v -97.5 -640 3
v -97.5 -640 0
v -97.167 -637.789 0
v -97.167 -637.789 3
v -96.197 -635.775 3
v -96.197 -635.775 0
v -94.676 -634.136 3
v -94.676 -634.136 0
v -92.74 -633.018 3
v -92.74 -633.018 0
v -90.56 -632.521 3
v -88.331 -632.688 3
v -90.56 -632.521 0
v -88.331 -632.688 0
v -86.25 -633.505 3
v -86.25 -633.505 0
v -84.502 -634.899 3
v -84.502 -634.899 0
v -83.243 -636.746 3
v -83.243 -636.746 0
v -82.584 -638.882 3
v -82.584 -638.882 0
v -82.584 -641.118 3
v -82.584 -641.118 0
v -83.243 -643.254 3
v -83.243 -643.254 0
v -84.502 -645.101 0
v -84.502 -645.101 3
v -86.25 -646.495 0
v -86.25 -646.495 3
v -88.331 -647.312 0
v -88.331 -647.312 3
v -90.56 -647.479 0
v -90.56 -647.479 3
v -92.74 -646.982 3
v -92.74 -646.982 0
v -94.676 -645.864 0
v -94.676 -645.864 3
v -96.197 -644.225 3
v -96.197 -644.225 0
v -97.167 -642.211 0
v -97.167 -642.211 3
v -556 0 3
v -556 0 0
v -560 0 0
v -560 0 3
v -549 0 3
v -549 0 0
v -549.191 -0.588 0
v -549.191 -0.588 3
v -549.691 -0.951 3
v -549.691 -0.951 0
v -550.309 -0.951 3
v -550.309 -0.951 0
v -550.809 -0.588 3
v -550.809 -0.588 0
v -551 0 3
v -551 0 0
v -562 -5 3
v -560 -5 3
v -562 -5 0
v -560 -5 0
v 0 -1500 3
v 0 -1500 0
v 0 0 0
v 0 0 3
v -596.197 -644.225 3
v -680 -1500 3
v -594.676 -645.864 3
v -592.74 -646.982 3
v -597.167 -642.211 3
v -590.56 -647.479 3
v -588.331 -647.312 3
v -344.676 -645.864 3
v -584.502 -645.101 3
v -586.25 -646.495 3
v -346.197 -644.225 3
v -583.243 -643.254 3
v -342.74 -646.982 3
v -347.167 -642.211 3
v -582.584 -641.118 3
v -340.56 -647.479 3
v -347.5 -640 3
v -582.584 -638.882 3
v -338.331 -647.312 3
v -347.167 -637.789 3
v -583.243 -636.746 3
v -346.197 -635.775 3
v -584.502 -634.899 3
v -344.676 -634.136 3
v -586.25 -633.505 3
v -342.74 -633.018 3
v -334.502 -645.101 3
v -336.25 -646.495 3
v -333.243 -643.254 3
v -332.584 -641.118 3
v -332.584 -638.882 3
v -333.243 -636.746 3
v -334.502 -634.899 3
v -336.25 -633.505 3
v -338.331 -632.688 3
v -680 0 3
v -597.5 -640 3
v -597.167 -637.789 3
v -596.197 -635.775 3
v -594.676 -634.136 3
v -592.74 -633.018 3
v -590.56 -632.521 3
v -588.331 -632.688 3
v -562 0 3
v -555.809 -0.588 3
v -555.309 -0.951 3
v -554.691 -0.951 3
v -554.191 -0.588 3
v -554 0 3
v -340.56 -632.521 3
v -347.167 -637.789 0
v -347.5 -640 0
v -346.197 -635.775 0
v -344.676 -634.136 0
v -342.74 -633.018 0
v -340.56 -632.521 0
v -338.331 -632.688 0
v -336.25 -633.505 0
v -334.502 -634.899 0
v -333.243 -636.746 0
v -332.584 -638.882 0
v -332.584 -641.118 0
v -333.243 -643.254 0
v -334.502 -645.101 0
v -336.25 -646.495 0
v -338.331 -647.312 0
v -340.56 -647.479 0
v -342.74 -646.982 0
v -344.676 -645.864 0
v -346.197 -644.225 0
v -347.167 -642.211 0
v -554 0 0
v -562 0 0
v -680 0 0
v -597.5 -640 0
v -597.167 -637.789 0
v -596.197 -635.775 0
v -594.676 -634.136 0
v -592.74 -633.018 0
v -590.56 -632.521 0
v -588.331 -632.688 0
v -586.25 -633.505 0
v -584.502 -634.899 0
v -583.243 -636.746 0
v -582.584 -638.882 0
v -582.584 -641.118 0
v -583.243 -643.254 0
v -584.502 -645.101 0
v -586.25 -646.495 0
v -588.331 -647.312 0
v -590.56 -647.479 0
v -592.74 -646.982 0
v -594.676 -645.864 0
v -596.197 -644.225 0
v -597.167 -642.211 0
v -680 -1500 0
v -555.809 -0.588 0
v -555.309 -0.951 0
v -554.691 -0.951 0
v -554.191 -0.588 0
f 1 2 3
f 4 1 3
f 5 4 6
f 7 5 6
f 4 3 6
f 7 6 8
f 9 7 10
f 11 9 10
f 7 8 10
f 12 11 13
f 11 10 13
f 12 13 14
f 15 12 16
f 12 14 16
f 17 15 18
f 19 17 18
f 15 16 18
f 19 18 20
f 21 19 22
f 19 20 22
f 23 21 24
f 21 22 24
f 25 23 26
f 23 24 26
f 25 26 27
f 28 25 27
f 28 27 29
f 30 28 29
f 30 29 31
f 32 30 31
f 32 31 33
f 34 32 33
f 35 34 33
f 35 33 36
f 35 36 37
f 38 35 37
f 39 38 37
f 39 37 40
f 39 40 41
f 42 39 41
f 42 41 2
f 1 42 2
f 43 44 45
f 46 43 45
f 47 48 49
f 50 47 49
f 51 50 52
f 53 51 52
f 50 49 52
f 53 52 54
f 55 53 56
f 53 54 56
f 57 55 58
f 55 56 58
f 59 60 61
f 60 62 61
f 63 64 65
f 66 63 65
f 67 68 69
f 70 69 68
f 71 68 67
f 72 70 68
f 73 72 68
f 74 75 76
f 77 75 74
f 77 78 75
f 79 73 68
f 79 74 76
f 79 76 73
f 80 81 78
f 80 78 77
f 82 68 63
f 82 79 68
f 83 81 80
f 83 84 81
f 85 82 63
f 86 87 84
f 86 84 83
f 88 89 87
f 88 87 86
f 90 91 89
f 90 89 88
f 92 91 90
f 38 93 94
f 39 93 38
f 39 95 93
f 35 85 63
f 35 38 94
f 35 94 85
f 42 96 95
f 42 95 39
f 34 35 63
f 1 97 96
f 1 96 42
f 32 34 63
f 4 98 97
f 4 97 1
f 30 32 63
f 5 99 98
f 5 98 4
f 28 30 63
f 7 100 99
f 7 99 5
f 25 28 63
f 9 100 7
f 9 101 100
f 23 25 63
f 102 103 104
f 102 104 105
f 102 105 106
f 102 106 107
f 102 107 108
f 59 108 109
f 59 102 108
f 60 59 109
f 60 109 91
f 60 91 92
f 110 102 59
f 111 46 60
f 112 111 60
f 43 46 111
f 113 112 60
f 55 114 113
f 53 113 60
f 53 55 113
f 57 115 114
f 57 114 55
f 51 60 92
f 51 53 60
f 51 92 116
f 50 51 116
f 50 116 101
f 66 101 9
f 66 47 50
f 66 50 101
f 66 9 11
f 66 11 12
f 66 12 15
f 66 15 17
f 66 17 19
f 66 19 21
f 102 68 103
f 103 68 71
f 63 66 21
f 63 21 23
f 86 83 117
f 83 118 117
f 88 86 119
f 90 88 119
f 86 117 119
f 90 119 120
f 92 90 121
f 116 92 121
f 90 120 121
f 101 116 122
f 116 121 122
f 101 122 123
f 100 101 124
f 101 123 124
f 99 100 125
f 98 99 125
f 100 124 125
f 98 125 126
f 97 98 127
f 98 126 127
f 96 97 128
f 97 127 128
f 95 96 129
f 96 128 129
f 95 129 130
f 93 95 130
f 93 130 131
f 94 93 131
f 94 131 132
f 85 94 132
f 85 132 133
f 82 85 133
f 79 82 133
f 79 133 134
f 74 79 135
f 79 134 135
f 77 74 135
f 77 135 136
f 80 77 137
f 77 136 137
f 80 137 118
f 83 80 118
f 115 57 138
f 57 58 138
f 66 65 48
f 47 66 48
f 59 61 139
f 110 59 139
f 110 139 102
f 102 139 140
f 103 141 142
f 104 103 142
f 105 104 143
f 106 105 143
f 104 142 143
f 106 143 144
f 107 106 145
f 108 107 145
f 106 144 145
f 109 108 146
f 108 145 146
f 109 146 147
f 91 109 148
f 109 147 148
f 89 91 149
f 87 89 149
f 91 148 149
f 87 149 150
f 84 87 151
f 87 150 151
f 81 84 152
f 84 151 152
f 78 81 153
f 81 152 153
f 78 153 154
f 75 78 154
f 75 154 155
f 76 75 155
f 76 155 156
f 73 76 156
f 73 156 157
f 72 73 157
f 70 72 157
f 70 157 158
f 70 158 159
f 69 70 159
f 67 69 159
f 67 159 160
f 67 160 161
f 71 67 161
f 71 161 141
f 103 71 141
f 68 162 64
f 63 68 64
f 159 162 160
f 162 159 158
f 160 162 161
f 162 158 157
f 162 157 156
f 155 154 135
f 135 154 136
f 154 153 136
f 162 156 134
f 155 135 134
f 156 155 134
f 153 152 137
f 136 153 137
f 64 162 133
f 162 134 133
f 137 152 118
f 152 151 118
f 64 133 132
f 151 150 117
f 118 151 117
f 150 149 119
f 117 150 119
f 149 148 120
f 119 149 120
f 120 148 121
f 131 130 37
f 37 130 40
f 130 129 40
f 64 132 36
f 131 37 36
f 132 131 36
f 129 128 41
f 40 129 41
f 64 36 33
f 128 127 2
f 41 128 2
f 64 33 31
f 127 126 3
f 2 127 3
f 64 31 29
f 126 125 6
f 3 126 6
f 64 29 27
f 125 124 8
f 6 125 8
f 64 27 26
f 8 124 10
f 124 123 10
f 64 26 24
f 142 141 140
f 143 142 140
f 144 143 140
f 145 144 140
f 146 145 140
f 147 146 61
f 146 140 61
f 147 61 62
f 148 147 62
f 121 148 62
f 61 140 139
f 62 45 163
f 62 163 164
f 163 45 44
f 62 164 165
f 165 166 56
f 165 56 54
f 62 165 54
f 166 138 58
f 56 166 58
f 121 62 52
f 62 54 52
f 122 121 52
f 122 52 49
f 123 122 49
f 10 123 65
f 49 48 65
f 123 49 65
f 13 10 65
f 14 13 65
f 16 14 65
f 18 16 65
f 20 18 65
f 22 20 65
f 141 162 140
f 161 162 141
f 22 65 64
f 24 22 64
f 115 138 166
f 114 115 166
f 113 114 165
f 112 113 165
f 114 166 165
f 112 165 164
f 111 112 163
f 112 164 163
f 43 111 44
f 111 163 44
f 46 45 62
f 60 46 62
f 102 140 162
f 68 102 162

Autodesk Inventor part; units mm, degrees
ref_plane "YZ Plane" through (0, 0, 0) normal (1, 0, 0) x (0, 1, 0)
ref_plane "XZ Plane" through (0, 0, 0) normal (0, 1, 0) x (-1, 0, 0)
ref_plane "XY Plane" through (0, 0, 0) normal (0, 0, 1) x (1, 0, 0)
sketch "Sketch1" plane through (0, 0, 0) normal (0, 0, 1) x (1, 0, 0)
  line L0 (0, 0) -> (-680, 0)
  line L1 (-680, 0) -> (-680, -1500)
  line L2 (-680, -1500) -> (0, -1500)
  line L3 (0, -1500) -> (0, 0)
  line L4 (0, 0) -> (-40, 0)
  line L5 (-40, 0) -> (-40, -35)
  line L6 (-40, -35) -> (0, -35)
  line L7 (0, -35) -> (0, 0)
  line L8 (0, -1500) -> (-40, -1500)
  line L9 (-40, -1500) -> (-40, -1465)
  line L10 (-40, -1465) -> (0, -1465)
  line L11 (0, -1465) -> (0, -1500)
  line L12 (-680, 0) -> (-640, 0)
  line L13 (-640, 0) -> (-640, -35)
  line L14 (-640, -35) -> (-680, -35)
  line L15 (-680, -35) -> (-680, 0)
  line L16 (-680, -1500) -> (-640, -1500)
  line L17 (-640, -1500) -> (-640, -1465)
  line L18 (-640, -1465) -> (-680, -1465)
  line L19 (-680, -1465) -> (-680, -1500)
  line L20 (-240, -1500) -> (-140, -1500)
  line L21 (-140, -1500) -> (-140, -1465)
  line L22 (-140, -1465) -> (-240, -1465)
  line L23 (-240, -1465) -> (-240, -1500)
  line L24 (-240, 0) -> (-140, 0)
  line L25 (-140, 0) -> (-140, -35)
  line L26 (-140, -35) -> (-240, -35)
  line L27 (-240, -35) -> (-240, 0)
  point P0 (0, -35)
  point P1 (-40, 0)
  point P2 (-40, -1500)
  point P3 (0, -1465)
  point P4 (-140, -1500)
  point P5 (-140, 0)
  point P6 (-640, 0)
  point P7 (-680, -35)
  point P8 (-300, -35)
  point P9 (-300, 0)
  point P10 (-260, -2265)
  point P11 (-260, -2300)
  point P12 (-260, -35)
  point P13 (-260, 0)
  point P14 (-300, -2265)
  point P15 (-300, -2300)
  point P16 (-240, 0)
  dimension "d22" = 680
  dimension "d23" = 1500
  dimension "d24" = 40
  dimension "d25" = 35
  dimension "d28" = 100
  dimension "d29" = 100
extrude "Plate1" add sketch "Sketch1" along normal blind 3
sketch "Sketch5" plane through (0, 0, 0) normal (0, 0, -1) x (-1, 0, 0)
  line L0 (680, 0) -> (580, 0) construction
  line L1 (580, 0) -> (580, -2) construction
  line L2 (580, -2) -> (680, -2) construction
  line L3 (680, -2) -> (680, 0) construction
  line L4 (580, 0) -> (578.4752, -4.6556)
  arc A0 (577.5248, -4.6556) -> (578.4752, -4.6556) centre (578, -4.5) ccw
  line L5 (577.5248, -4.6556) -> (576, 0)
  line L6 (576, 0) -> (580, 0)
  line L7 (576, 0) -> (574, 0) construction
  line L8 (574, 0) -> (572, 0)
  line L9 (572, 0) -> (572, -5)
  line L10 (572, -5) -> (574, -5)
  line L11 (574, -5) -> (574, 0)
  line L12 (572, 0) -> (570, 0) construction
  line L13 (570, 0) -> (568, 0)
  line L14 (568, 0) -> (568, -5)
  line L15 (568, -5) -> (570, -5)
  line L16 (570, -5) -> (570, 0)
  line L17 (568, 0) -> (566, 0) construction
  line L18 (566, 0) -> (564, 0)
  line L19 (564, 0) -> (564, -5)
  line L20 (564, -5) -> (566, -5)
  line L21 (566, -5) -> (566, 0)
  line L22 (564, 0) -> (562, 0) construction
  line L23 (562, 0) -> (560, 0)
  line L24 (560, 0) -> (560, -5)
  line L25 (560, -5) -> (562, -5)
  line L26 (562, -5) -> (562, 0)
  line L27 (560, 0) -> (555, 0) construction
  line L28 (555, 0) -> (550, 0) construction
  circle A1 centre (555, 0) radius 1
  circle A2 centre (550, 0) radius 1
  point P0 (0, 0)
  point P1 (578, 0)
  dimension "d30" = 100
  dimension "d31" = 2
  dimension "d32" = 5
  dimension "d33" = 4
  dimension "d34" = 0.5
  dimension "d35" = 5
  dimension "d36" = 5
  dimension "d37" = 5
  dimension "d38" = 2
extrude "Cut1" cut sketch "Sketch5" against normal blind 3 contours L26 L25 L24 L23 | A1 | A2
sketch "Sketch6" plane through (0, 0, 0) normal (0, 0, -1) x (-1, 0, 0)
  circle A0 centre (340, -640) radius 7.5
  arc A1 (549, 0) -> (551, 0) centre (550, 0) ccw projected
  line L0 (554, 0) -> (551, 0) projected
  arc A2 (554, 0) -> (556, 0) centre (555, 0) ccw projected
  line L1 (560, 0) -> (556, 0) projected
  line L2 (560, 0) -> (560, -5) projected
  line L3 (560, -5) -> (562, -5) projected
  line L4 (562, -5) -> (562, 0) projected
  line L5 (680, 0) -> (562, 0) projected
  line L6 (680, -1500) -> (680, 0) projected
  line L7 (0, -1500) -> (680, -1500) projected
  line L8 (0, 0) -> (0, -1500) projected
  line L9 (549, 0) -> (0, 0) projected
  point P0 (340, -1500)
  dimension "d43" = 15
  dimension "d44" = 860
extrude "Cut2" cut sketch "Sketch6" against normal blind 3 contours A0
pattern_linear "Rectangular Pattern1" count 3 spacing 250 along (1, 0, 0) of "Cut2" first direction both ways yes
equation "\"d33\" = 2 * d31"
equation "\"d34\" = 0.25 * d31"
equation "\"d38\" = d31"
equation "\"d39\" = Thickness"
equation "\"d41\" = Thickness"
equation "\"d2\" = Thickness"
equation "\"BendReliefWidth\" = Thickness"
equation "\"BendReliefDepth\" = 0.5 * Thickness"
equation "\"CornerReliefSize\" = 4 * Thickness"
equation "\"MinimumRemnant\" = 2 * Thickness"
equation "\"TransitionRadius\" = BendRadius"
equation "\"JacobiRadiusSize\" = BendRadius"
equation "\"GapSize\" = Thickness"
equation "\"Thickness\" = 3"
equation "\"BendRadius\" = 5"
properties part number "GnG X.6 floor sheet" material "Stainless Steel"
